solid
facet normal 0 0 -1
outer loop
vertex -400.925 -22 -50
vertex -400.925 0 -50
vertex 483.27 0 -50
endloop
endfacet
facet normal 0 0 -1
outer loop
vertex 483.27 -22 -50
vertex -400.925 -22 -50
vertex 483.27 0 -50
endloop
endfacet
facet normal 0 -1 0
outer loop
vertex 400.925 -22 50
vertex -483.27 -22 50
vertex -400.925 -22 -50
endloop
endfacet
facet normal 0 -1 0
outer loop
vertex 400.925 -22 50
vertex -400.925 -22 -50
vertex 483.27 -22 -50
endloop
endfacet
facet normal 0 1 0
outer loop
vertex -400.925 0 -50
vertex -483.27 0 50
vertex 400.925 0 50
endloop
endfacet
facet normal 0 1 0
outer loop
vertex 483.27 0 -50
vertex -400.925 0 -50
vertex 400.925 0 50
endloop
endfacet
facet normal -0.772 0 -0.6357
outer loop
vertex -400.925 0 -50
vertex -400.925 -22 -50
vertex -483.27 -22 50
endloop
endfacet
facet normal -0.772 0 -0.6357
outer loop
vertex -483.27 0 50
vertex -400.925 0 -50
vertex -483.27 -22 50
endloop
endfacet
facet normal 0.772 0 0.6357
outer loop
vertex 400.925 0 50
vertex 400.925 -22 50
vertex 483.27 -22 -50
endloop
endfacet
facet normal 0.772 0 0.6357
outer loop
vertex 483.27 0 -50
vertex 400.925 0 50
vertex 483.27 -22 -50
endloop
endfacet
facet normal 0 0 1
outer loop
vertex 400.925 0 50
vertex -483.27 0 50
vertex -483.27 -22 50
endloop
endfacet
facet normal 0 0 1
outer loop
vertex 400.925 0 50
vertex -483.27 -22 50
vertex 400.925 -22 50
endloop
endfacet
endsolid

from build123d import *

# Parameters (mm, degrees)
F0_W     = 966.540682
F0_H     = 100
F1_DEPTH = 22
F3_DEPTH = 22
F5_DEPTH = 25


with BuildPart() as f1:
    # F0 (on Front) → F1 (new body)
    with BuildSketch(Plane.XZ):
        Rectangle(F0_W, F0_H)
    extrude(amount=F1_DEPTH)

    # F2 (on face) → F3 (cut)
    with BuildSketch(Plane.XZ.offset(22)):
        Polygon((-400.924605, -50), (-483.270341, 50), (-483.270341, -50), align=None)
    extrude(amount=-F3_DEPTH, mode=Mode.SUBTRACT)

    # F4 (on face) → F5 (cut)
    with BuildSketch(Plane.XZ.offset(22)):
        Polygon((483.270341, -50), (483.270341, 50), (400.924605, 50), align=None)
    extrude(amount=-F5_DEPTH, mode=Mode.SUBTRACT)


solid = f1.part
